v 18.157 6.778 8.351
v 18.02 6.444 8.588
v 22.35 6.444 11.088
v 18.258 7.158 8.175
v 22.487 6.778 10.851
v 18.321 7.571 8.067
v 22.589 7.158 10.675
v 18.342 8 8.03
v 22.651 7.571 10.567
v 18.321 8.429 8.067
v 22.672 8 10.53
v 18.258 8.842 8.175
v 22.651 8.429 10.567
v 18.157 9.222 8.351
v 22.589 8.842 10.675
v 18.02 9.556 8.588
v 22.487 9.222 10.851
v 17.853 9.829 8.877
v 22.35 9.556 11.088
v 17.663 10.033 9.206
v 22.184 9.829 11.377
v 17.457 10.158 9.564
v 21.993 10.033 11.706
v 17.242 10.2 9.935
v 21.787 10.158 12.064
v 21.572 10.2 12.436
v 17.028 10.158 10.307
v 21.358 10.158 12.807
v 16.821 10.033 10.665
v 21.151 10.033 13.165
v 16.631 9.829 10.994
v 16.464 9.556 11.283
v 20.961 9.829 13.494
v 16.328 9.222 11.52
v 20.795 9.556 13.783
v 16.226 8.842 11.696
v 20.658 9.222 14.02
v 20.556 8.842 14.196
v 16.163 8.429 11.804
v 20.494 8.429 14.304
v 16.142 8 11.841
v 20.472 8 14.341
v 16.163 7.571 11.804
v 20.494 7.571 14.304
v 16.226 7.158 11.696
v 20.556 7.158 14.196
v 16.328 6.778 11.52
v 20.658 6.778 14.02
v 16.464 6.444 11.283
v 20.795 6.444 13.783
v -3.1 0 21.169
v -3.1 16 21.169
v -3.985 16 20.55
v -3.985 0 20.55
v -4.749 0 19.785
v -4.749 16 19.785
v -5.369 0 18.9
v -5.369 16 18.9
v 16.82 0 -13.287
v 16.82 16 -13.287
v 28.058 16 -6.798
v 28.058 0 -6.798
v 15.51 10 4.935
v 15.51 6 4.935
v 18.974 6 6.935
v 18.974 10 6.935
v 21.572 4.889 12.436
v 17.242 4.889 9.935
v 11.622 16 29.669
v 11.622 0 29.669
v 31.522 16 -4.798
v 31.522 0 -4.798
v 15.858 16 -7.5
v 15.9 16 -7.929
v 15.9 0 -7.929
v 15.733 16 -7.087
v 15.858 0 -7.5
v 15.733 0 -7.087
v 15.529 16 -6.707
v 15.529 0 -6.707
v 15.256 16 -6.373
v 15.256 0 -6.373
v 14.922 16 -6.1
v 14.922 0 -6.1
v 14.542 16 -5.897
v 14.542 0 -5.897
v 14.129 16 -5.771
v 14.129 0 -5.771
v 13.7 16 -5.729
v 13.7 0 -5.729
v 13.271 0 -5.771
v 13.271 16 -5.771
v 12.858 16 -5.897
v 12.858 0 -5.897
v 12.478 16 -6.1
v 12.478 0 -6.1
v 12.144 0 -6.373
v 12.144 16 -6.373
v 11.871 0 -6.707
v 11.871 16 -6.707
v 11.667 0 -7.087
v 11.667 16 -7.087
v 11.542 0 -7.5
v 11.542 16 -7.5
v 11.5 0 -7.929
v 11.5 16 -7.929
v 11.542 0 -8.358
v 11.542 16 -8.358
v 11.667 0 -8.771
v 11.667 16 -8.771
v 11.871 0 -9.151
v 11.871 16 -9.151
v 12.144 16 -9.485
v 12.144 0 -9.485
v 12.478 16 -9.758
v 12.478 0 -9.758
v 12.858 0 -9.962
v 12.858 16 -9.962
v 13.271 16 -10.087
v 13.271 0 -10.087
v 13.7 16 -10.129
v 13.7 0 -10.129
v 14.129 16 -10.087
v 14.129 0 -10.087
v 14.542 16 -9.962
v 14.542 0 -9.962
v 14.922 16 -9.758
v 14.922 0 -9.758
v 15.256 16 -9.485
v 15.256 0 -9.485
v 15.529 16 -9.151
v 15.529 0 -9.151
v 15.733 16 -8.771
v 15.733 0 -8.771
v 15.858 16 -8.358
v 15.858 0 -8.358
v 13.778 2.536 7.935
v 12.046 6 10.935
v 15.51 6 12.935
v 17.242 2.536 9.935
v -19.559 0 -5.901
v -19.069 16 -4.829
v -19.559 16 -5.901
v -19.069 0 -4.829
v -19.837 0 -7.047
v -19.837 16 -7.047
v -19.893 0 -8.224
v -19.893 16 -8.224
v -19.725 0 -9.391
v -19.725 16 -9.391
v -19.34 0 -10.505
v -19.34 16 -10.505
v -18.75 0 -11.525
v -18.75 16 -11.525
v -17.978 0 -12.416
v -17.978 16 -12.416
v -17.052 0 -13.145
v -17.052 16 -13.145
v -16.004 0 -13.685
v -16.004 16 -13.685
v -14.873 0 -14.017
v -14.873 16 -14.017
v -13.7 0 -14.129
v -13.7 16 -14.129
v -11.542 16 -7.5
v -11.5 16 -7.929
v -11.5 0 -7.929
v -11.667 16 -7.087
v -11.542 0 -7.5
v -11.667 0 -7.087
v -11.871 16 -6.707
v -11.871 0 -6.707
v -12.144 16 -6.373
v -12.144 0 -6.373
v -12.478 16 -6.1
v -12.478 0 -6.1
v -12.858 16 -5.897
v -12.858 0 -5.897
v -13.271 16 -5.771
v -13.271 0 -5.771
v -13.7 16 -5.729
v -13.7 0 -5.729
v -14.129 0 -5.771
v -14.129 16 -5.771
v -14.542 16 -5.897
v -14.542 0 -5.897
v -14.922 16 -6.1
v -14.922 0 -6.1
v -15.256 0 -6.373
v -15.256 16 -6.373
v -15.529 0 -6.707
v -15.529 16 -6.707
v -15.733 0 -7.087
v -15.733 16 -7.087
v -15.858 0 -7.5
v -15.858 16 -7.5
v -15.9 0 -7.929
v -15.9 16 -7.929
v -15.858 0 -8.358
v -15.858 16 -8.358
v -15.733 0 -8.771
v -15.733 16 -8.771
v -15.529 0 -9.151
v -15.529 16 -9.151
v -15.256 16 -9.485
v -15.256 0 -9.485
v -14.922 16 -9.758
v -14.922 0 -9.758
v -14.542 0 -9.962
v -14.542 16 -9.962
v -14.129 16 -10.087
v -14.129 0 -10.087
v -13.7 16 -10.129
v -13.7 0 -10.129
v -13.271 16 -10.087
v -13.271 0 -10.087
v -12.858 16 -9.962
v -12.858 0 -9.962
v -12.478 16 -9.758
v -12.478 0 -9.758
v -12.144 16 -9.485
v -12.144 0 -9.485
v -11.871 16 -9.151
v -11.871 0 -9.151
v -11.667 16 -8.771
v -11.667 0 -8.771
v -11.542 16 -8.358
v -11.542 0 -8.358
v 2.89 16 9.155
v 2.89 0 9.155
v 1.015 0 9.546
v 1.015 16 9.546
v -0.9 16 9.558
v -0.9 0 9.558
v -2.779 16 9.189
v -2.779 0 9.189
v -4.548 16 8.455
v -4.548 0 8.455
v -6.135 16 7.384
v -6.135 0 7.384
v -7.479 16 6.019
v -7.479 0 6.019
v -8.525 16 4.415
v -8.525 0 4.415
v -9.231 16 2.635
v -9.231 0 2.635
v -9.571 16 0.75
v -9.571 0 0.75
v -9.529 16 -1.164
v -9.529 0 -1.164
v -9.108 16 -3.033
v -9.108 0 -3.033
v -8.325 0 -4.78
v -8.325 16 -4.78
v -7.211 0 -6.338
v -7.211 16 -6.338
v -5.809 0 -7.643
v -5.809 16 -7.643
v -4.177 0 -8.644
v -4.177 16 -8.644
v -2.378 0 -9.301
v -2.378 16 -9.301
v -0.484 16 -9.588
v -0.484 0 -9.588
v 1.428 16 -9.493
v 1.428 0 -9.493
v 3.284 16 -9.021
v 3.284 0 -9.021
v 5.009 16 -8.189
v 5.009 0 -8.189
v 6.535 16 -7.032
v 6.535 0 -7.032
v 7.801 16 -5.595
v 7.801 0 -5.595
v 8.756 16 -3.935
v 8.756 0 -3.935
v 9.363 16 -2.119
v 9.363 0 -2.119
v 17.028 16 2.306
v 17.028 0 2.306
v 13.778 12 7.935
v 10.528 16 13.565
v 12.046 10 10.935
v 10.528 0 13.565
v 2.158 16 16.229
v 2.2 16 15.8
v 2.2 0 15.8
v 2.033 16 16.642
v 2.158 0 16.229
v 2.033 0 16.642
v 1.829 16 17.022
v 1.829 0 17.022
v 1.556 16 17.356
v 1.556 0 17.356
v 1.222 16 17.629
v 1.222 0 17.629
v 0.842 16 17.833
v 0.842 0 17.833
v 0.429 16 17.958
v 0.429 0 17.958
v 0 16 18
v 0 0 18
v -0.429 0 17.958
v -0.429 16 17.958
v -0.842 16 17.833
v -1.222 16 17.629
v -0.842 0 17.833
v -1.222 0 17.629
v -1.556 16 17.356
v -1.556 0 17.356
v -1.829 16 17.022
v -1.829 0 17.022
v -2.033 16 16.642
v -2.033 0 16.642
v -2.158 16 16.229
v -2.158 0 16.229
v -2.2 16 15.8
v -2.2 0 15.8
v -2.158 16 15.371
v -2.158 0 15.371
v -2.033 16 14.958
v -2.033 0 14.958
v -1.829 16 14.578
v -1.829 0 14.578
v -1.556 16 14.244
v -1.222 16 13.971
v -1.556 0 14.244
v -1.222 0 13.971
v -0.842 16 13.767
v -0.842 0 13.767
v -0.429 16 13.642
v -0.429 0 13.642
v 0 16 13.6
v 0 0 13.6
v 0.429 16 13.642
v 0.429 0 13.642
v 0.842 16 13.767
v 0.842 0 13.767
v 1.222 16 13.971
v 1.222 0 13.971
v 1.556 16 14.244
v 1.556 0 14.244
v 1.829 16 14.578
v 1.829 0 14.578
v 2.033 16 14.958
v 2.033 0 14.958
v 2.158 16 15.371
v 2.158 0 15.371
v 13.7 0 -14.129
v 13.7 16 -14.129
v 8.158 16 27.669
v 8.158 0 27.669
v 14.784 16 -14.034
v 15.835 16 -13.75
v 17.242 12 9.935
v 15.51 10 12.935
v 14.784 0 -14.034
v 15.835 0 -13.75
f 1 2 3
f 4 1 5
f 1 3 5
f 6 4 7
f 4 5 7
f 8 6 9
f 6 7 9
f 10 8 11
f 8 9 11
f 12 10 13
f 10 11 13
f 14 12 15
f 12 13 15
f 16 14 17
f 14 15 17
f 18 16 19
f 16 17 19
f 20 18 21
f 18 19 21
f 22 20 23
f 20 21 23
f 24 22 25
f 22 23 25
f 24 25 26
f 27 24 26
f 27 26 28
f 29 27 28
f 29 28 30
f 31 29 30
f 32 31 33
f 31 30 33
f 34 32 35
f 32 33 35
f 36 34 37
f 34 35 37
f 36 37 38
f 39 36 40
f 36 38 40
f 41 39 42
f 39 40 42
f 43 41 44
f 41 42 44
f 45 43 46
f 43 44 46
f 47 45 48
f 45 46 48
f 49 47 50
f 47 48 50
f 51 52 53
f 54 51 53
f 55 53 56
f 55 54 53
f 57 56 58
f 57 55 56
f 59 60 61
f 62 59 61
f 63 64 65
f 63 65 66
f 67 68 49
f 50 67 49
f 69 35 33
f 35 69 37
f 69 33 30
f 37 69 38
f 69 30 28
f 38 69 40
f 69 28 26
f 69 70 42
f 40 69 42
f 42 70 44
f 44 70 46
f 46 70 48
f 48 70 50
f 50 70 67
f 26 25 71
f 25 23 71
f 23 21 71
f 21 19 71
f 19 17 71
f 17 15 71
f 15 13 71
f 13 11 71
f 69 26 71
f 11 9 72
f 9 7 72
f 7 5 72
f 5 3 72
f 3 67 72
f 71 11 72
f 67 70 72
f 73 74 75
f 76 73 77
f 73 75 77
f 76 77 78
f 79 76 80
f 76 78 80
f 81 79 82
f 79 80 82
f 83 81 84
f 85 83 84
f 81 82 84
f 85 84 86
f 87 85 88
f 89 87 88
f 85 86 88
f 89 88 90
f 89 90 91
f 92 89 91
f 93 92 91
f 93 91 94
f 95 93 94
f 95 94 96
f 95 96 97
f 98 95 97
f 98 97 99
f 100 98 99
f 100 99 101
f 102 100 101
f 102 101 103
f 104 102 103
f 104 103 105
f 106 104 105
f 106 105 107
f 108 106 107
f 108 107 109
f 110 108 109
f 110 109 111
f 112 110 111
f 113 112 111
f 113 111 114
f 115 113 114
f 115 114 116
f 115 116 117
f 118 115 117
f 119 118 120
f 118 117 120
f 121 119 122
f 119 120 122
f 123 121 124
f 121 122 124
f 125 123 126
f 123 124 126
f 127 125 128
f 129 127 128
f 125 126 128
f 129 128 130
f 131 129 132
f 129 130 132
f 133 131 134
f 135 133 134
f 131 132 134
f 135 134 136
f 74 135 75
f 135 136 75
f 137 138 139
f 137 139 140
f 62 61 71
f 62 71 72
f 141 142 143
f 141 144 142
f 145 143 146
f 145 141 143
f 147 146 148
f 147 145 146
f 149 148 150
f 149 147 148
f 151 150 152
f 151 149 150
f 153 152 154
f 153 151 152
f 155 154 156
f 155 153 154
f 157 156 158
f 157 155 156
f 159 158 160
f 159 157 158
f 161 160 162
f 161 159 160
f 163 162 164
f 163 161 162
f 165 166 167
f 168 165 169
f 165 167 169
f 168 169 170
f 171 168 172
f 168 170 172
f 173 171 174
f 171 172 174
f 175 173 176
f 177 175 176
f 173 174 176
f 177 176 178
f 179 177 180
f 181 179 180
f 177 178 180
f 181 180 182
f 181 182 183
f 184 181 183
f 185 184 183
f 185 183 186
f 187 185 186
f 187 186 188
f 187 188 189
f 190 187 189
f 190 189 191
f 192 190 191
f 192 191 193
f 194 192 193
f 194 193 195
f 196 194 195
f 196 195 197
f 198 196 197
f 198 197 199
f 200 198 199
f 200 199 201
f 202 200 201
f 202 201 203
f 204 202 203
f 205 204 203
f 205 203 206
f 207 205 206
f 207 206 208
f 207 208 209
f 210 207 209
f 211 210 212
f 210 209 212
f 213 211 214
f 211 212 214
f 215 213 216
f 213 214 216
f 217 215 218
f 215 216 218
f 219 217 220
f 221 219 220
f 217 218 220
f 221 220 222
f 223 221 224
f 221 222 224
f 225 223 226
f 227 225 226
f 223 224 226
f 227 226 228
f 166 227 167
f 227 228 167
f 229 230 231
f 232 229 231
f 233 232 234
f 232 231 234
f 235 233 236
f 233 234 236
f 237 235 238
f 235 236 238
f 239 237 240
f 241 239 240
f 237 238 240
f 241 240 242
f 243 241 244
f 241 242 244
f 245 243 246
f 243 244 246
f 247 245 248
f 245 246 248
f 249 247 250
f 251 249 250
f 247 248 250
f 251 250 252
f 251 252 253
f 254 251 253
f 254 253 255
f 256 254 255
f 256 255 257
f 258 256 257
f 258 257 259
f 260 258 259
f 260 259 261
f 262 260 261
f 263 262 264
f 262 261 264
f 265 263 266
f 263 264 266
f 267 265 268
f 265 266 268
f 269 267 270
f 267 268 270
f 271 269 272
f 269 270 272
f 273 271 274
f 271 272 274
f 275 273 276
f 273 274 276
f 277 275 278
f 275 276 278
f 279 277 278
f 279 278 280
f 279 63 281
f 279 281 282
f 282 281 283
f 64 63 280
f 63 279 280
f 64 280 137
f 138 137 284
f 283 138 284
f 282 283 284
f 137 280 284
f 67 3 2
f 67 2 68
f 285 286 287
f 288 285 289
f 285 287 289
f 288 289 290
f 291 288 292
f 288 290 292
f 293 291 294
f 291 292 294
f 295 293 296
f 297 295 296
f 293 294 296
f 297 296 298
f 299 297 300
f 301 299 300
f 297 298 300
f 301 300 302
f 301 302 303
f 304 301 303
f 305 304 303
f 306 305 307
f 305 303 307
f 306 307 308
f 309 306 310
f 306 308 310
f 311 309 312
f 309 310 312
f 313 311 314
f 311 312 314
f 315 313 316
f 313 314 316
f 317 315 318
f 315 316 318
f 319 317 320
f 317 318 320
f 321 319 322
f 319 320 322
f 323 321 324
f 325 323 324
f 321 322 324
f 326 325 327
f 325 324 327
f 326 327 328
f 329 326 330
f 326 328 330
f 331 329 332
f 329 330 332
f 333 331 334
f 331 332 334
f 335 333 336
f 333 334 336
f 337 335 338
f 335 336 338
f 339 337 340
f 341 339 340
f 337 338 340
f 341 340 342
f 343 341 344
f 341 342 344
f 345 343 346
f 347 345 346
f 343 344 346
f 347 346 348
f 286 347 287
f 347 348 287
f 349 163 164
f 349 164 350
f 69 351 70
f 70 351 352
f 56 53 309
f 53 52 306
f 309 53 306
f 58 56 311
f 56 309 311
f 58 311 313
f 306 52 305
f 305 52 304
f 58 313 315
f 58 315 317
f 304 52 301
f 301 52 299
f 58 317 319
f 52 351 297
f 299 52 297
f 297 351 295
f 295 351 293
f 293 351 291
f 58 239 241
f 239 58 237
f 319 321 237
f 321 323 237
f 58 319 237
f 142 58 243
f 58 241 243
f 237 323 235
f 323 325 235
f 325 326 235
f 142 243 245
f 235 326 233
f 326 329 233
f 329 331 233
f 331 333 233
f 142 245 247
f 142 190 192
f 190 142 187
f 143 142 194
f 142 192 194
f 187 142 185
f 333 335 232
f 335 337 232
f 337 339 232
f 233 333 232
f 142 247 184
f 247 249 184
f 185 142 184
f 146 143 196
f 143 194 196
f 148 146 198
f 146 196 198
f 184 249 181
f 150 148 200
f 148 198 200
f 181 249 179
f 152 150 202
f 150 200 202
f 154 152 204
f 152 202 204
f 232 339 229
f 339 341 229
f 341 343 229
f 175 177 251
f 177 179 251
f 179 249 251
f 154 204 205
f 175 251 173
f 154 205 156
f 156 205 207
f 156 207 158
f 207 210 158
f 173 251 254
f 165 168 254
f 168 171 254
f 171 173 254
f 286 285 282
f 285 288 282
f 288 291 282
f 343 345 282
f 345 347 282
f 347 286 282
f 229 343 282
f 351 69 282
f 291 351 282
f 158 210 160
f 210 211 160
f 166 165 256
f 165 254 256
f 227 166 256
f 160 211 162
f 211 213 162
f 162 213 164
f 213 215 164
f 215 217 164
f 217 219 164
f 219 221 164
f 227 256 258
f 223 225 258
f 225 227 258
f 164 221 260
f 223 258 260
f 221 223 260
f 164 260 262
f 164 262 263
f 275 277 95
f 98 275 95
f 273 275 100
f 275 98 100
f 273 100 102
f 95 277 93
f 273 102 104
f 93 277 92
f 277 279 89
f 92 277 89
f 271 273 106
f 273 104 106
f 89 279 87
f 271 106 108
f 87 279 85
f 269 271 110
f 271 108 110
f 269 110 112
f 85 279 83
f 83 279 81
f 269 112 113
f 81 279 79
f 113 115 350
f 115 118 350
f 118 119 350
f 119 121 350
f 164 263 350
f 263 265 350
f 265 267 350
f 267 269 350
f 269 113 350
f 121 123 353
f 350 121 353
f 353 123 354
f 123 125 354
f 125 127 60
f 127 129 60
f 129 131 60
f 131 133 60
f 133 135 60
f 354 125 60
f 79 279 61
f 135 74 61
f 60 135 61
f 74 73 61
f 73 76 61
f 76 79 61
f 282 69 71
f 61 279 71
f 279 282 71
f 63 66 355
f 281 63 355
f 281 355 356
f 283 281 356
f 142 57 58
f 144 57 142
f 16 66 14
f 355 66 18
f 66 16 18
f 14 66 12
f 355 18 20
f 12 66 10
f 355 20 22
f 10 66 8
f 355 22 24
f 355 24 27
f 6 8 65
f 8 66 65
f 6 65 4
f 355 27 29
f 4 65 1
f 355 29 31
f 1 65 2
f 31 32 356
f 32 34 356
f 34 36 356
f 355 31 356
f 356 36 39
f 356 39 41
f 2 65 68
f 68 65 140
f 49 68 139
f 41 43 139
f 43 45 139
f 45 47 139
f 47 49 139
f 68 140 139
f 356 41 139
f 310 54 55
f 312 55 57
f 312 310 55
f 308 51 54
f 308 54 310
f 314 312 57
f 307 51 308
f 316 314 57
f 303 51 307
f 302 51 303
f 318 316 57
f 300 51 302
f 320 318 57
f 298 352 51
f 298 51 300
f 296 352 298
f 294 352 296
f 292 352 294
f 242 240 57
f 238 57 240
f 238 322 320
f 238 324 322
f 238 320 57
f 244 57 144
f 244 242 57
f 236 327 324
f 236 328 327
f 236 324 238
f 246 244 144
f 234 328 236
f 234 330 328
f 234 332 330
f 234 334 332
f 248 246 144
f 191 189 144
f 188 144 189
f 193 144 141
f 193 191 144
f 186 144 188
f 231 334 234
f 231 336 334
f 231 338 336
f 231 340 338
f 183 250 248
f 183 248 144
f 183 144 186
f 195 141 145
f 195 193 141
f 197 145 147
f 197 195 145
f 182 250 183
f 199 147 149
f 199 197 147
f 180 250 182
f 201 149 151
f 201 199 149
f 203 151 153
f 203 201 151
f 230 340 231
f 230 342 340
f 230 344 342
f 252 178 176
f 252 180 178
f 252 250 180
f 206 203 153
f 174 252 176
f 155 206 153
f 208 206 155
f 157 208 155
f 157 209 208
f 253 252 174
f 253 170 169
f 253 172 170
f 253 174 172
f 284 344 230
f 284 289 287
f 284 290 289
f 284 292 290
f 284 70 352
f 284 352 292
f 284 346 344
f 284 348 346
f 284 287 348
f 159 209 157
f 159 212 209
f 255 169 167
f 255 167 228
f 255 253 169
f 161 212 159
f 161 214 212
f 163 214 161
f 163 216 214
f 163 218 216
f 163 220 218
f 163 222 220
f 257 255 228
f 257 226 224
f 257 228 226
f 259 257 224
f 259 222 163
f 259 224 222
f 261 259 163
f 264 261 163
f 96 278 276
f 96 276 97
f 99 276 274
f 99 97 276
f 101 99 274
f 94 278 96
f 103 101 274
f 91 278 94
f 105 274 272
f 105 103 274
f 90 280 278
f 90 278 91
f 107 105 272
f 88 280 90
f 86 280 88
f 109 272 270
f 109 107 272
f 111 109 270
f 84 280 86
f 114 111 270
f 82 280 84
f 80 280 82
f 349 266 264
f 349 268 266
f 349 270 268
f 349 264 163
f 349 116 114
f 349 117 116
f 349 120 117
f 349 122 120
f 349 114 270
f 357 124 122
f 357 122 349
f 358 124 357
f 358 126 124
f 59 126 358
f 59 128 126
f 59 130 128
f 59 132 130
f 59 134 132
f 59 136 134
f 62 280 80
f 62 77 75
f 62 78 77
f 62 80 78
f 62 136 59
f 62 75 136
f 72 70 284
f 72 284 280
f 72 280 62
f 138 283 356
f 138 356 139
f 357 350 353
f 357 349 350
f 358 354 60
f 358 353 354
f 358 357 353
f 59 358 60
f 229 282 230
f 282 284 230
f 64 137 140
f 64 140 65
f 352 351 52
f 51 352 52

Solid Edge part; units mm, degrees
sketch "Sketch1" plane through (0, 0, 0) normal (0, -1, 0) x (1, 0, 0)
  line L0 (-5.3694, 18.9) -> (-19.0694, -4.8291)
  arc A0 (-13.7, -14.1291) -> (-19.0694, -4.8291) centre (-13.7, -7.9291) cw
  line L1 (-13.7, -14.1291) -> (13.7, -14.1291)
  arc A1 (19.0694, -4.8291) -> (13.7, -14.1291) centre (13.7, -7.9291) cw
  line L2 (5.3694, 18.9) -> (19.0694, -4.8291)
  arc A2 (-5.3694, 18.9) -> (5.3694, 18.9) centre (0, 15.8) cw
  dimension "D1" = 5.3694
extrude "Protrusion1" add sketch "Sketch1" against normal blind 16
sketch "Sketch2" plane through (0, 0, 0) normal (0, -1, 0) x (1, 0, 0)
  circle A0 centre (-13.7, -7.9291) radius 2.2
  circle A1 centre (13.7, -7.9291) radius 2.2
  circle A2 centre (0, 15.8) radius 2.2
  dimension "D1" = 19.2
  dimension "D2" = 4
  dimension "D3" = 4.4
  dimension "D4" = 6.2
  dimension "D5" = 6.2
  dimension "D6" = 4.4
  dimension "D7" = 6.2
  dimension "D8" = 27.4
  dimension "D9" = 27.4
  dimension "D10" = 27.4
extrude "Cutout1" cut sketch "Sketch2" against normal blind 457.8755
sketch "Sketch3" plane through (0, 0, 0) normal (0, -1, 0) x (1, 0, 0)
  circle A0 centre (0, 0) radius 9.6
extrude "Cutout2" cut sketch "Sketch3" against normal blind 434.4917
sketch "Sketch4" plane through (0, 0, 3.9355) normal (0, -1, 0) x (-0.5, 0, 0.866)
  line L0 (-23.325, -5.9323) -> (-23.325, -18.9323)
  line L1 (-23.325, -18.9323) -> (16.475, -18.9323)
  line L2 (16.475, -18.9323) -> (16.475, -5.9323)
  line L3 (12.7755, -8.7037) -> (16.475, -5.9323)
  line L4 (-20.9306, -8.7037) -> (12.7755, -8.7037)
  line L5 (-20.9306, -5.9323) -> (-20.9306, -8.7037)
  line L6 (-23.325, -5.9323) -> (-20.9306, -5.9323)
  dimension "D1" = 13
extrude "Protrusion2" add sketch "Sketch4" against normal up to vertex (16 mm away)
sketch "Sketch5" plane through (3.1086, 0, 6.2098) normal (0, -1, 0) x (-0.5, 0, 0.866)
  line L0 (-10.3403, 2.4623) -> (-10.3403, -10.1029)
  line L1 (-10.3403, -10.1029) -> (2.6597, -10.1029)
  line L2 (2.6597, -10.1029) -> (2.6597, 2.4623)
  line L3 (2.6597, 2.4623) -> (-10.3403, 2.4623)
  dimension "D1" = 5
  dimension "D2" = 5
  dimension "D3" = 5
extrude "ExtrudedCutout_18" cut sketch "Sketch5" against normal blind 196.9446
sketch "Sketch6" plane through (13.7782, 8, 7.9355) normal (-0.866, 0, -0.5) x (0, -1, 0)
  line L0 (-2, 3.4641) -> (2, 3.4641)
  line L1 (-4, 0) -> (-2, 3.4641)
  line L2 (-2, -3.4641) -> (-4, 0)
  line L3 (2, -3.4641) -> (-2, -3.4641)
  line L4 (5.4641, 0) -> (2, -3.4641)
  line L5 (2, 3.4641) -> (5.4641, 0)
extrude "ExtrudedCutout_19" cut sketch "Sketch6" against normal blind 4
sketch "Sketch7" plane through (18.1083, 8, 10.4355) normal (0.866, 0, 0.5) x (-0.5, 0, 0.866)
  line L0 (-19.9, 8) -> (19.9, 8)
  line L1 (19.9, -8) -> (19.9, 8)
  line L2 (-19.9, -8) -> (19.9, -8)
  line L3 (-19.9, -8) -> (-19.9, 8)
extrude "ExtrudedProtrusion_14" add sketch "Sketch7" along normal blind 4
sketch "Sketch8" plane through (21.5724, 8, 12.4355) normal (0.866, 0, 0.5) x (-0.5, 0, 0.866)
  line L0 (-1.5556, 1.5556) -> (0, 3.1113)
  line L1 (0, 3.1113) -> (1.5556, 1.5556)
  arc A0 (1.5556, 1.5556) -> (-1.5556, 1.5556) centre (0, 0) cw
extrude "ExtrudedCutout_20" cut sketch "Sketch8" against normal blind 25.1595
